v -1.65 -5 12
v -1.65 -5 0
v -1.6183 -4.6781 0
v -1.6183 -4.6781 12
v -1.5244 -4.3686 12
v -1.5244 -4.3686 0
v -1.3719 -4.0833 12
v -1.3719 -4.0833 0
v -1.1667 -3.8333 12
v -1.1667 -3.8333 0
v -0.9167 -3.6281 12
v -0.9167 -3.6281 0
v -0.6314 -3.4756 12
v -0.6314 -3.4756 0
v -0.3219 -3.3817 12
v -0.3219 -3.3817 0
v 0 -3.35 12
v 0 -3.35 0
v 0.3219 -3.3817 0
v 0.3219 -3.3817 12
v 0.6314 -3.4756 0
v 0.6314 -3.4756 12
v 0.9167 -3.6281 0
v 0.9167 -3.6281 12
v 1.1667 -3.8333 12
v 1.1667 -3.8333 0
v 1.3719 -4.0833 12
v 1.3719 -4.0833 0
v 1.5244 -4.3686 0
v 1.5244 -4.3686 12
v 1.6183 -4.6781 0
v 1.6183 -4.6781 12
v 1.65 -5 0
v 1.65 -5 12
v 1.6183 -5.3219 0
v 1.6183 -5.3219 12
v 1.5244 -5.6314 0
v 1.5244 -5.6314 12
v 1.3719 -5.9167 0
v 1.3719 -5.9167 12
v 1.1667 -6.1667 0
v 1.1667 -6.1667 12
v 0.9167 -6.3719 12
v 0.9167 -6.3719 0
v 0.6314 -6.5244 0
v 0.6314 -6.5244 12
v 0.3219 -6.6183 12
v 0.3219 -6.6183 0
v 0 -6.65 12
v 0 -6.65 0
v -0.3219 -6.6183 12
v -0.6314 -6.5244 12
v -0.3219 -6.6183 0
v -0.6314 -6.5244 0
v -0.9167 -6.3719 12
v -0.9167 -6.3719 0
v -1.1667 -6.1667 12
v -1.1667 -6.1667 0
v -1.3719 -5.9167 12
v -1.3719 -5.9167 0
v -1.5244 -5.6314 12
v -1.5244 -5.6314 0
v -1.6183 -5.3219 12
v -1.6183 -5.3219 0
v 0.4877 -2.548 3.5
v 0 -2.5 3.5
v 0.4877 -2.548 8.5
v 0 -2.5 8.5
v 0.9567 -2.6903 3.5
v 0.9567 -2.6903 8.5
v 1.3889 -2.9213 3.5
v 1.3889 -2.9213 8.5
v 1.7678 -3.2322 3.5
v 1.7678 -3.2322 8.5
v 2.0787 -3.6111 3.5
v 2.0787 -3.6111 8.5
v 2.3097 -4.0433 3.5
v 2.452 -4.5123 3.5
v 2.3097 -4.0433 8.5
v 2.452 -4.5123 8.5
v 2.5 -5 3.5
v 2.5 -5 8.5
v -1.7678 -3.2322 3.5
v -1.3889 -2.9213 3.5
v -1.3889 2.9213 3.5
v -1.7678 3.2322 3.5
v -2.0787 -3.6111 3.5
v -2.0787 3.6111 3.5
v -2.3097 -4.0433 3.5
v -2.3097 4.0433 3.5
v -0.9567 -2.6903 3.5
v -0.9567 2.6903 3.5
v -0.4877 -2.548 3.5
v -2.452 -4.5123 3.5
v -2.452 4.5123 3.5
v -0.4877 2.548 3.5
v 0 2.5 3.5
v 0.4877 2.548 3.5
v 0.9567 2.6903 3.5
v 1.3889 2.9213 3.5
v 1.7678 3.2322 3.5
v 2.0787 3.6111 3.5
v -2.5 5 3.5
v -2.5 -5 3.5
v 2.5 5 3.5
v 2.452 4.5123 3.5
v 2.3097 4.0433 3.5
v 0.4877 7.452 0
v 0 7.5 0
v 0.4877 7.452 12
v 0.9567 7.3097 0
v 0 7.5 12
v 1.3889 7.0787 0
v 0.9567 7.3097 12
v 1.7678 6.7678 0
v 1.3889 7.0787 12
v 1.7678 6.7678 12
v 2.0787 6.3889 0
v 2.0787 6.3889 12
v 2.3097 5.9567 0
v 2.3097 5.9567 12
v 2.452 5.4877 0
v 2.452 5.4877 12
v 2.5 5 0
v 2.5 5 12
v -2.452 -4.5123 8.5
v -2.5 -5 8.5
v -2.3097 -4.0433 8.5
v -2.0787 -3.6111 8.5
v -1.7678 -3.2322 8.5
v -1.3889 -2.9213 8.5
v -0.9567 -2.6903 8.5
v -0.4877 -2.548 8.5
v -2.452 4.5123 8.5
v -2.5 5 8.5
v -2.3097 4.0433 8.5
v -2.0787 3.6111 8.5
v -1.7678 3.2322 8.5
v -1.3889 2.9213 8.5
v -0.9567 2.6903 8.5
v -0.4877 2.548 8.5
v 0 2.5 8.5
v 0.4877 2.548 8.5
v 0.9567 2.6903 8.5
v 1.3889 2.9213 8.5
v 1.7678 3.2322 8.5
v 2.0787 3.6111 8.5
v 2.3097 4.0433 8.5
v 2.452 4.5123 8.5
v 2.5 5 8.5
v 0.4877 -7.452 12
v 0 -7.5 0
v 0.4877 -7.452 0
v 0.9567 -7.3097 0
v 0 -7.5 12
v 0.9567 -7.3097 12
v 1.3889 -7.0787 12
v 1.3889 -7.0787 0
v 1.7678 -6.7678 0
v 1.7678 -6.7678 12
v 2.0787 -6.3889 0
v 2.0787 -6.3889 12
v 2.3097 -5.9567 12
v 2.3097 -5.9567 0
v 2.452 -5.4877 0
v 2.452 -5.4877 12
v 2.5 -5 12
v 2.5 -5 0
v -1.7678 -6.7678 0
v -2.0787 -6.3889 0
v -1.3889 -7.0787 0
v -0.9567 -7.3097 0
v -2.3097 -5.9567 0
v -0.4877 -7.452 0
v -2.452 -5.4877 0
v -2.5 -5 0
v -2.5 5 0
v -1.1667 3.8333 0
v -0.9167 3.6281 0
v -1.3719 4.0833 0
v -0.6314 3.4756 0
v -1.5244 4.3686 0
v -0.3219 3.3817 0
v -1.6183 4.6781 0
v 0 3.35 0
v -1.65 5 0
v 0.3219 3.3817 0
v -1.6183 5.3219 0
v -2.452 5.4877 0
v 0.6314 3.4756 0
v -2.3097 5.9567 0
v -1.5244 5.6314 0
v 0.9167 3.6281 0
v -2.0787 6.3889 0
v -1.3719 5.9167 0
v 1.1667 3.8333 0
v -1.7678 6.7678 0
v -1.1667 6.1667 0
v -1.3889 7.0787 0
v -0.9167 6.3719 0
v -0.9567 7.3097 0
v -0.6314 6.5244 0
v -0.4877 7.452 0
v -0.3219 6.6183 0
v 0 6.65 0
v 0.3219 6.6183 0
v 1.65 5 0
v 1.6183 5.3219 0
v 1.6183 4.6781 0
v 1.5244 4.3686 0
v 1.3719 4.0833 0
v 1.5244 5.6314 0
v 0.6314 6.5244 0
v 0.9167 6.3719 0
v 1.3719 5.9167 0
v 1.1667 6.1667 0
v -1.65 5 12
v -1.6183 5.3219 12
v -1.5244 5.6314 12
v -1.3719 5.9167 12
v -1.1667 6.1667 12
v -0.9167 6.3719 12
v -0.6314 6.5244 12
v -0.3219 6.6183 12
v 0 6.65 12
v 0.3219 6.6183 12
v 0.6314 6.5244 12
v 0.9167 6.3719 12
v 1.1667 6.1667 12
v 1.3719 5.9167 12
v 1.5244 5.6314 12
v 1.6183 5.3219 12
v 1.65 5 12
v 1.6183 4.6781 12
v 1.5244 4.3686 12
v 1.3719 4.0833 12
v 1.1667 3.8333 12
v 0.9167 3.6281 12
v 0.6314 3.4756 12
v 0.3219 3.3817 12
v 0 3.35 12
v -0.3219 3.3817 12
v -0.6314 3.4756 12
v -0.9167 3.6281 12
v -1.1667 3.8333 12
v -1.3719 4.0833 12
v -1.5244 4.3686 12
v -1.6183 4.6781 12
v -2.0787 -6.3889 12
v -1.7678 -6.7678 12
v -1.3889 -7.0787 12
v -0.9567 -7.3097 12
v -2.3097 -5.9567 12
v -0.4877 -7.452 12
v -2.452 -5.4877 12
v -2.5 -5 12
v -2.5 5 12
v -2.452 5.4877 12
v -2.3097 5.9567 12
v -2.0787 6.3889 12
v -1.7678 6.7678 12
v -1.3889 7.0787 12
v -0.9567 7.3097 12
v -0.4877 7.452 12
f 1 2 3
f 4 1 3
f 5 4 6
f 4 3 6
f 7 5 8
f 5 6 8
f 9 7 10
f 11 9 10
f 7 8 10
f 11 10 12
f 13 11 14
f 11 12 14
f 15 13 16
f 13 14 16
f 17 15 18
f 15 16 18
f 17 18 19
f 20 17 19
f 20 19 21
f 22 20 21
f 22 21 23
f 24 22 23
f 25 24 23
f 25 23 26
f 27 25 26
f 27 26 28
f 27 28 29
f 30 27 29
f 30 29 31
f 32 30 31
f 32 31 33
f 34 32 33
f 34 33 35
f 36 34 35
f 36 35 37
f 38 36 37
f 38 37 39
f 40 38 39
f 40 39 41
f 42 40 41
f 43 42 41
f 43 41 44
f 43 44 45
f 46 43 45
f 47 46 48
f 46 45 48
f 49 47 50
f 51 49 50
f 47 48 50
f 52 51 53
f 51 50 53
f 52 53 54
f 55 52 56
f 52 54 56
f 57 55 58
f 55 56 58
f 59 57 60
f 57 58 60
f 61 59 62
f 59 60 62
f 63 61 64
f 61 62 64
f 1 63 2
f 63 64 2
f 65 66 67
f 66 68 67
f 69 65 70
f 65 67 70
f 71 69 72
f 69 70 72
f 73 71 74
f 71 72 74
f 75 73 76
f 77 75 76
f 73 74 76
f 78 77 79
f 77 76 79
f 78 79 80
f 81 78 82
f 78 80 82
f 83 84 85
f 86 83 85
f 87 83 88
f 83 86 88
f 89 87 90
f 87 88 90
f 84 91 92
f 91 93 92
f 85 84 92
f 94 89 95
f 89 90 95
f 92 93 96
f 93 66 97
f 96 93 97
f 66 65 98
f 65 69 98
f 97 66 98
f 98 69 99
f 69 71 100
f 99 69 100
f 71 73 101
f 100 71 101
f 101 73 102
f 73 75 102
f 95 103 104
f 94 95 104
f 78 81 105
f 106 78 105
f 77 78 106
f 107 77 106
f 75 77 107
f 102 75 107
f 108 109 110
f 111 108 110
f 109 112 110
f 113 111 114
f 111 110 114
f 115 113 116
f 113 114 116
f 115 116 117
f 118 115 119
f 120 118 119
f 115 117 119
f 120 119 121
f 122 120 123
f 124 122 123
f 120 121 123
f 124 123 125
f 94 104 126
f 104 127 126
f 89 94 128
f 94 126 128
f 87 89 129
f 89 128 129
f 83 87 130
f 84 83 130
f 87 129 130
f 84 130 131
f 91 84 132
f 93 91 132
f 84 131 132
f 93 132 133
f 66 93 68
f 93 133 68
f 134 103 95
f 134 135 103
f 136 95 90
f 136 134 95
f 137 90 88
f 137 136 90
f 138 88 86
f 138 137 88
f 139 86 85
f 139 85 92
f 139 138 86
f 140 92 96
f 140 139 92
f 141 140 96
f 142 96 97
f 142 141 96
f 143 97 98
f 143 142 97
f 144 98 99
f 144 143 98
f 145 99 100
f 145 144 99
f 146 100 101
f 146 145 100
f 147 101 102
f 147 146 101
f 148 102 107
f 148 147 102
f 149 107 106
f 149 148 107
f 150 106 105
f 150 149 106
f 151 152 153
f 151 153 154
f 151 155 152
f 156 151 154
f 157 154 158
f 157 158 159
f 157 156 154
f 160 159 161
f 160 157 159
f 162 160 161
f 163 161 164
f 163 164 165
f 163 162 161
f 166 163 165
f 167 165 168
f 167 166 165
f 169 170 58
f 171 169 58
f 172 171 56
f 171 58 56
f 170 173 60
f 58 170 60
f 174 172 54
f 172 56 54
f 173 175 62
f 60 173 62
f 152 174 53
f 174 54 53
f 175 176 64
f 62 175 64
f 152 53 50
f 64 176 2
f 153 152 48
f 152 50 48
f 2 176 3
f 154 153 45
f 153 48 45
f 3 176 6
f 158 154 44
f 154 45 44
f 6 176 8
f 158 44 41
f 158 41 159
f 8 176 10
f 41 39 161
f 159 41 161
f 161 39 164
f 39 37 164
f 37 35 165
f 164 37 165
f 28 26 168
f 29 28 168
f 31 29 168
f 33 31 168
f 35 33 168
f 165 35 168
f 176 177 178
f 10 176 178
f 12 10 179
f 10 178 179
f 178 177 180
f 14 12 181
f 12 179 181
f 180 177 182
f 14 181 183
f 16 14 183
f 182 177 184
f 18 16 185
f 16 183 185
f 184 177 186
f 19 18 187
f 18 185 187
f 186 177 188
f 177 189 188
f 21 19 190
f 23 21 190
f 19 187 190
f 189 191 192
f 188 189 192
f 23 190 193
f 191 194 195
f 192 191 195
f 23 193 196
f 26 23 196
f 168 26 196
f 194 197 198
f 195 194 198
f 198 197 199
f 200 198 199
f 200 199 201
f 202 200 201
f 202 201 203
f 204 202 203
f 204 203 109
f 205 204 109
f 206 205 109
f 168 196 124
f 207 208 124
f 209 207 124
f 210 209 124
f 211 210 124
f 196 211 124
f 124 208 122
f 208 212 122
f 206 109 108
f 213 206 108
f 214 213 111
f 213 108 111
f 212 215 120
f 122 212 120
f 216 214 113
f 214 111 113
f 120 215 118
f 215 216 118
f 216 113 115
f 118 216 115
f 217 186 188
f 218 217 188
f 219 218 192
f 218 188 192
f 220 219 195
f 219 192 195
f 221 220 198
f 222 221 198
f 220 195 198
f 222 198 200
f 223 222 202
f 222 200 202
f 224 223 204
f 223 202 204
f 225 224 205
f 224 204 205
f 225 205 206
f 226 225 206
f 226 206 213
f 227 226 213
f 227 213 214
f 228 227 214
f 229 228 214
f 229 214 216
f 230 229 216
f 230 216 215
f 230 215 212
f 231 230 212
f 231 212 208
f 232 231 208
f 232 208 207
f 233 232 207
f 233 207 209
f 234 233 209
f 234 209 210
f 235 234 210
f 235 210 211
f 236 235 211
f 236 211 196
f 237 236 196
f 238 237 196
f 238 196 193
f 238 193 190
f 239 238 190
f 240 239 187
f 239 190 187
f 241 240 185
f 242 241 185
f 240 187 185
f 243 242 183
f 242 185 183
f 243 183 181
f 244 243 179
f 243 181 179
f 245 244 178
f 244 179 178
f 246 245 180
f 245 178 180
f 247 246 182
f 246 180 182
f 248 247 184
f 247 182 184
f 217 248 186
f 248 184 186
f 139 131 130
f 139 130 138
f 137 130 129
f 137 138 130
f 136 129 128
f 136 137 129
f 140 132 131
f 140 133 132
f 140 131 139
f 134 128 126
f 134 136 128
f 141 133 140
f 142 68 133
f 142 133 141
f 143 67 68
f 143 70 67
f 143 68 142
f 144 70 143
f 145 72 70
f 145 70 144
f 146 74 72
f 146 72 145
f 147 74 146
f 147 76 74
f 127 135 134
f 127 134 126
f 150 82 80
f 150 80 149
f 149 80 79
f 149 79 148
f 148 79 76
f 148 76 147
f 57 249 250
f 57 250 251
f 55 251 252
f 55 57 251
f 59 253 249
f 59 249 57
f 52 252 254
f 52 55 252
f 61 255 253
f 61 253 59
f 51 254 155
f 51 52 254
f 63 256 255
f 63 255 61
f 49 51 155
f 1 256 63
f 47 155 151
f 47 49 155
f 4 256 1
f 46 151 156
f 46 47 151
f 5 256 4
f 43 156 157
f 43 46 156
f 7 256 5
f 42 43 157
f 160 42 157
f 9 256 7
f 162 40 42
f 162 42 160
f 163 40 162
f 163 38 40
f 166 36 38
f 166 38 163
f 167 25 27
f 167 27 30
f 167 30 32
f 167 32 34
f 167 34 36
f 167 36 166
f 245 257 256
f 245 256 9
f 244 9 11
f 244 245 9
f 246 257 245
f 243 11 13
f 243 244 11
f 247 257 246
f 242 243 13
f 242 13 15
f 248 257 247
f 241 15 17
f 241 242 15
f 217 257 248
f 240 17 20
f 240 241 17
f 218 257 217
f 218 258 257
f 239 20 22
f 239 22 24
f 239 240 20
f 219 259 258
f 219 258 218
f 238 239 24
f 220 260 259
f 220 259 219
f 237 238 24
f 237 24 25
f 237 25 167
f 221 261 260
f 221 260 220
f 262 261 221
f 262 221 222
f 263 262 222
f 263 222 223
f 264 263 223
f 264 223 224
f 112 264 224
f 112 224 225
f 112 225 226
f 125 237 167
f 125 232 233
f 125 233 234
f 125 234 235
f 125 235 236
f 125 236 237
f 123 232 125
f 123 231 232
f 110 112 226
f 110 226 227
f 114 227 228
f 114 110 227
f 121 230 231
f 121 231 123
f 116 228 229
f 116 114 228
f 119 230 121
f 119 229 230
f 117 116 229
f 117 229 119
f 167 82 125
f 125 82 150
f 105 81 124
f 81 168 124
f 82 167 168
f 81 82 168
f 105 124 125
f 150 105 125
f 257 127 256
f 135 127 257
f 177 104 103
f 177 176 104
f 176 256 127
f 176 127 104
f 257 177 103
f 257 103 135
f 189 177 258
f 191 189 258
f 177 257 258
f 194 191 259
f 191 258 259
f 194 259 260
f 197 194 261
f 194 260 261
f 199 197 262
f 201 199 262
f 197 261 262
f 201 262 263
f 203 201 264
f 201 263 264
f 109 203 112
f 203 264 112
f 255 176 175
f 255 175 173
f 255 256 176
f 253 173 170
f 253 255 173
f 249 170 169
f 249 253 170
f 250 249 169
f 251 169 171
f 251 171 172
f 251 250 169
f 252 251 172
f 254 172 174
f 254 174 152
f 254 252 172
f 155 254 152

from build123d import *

# Parameters (mm, degrees)
F0_W     = 5
F0_H     = 15
F1_DEPTH = 12
F2_W     = 5
F2_H     = 5
F3_DEPTH = 5
F4_R     = 2.49999
F6_D     = 3.3


# Not quite as in the source:
# - a fillet or chamfer is up to 0.001 mm smaller than in the source, because OpenCascade refuses the exact size


with BuildPart() as f1:
    # F0 (on Top) → F1 (new body)
    with BuildSketch(Plane.XY):
        Rectangle(F0_W, F0_H)
    extrude(amount=F1_DEPTH)

    # F2 (on face) → F3 (cut, through all)
    with BuildSketch(Plane.YZ.offset(2.5)):
        with Locations((0, 6)):
            Rectangle(F2_W, F2_H)
    extrude(amount=-F3_DEPTH, mode=Mode.SUBTRACT)

    # F4 (radius 2.5 in the source; OpenCascade refuses exactly that, so slightly less here)
    f4_edges = [f1.edges().sort_by_distance(p)[0] for p in [
        (2.5, -7.5, 6),
        (-2.5, -7.5, 6),
        (2.5, 7.5, 6),
        (-2.5, 7.5, 6),
        (-2.5, 2.5, 6),
        (-2.5, -2.5, 6),
        (2.5, -2.5, 6),
        (2.5, 2.5, 6),
    ]]
    fillet(f4_edges, radius=F4_R)

    # F6 (through all)
    with Locations(Plane.XY.offset(12)):
        with Locations((0, 5), (0, -5)):
            Hole(F6_D / 2)


solid = f1.part
